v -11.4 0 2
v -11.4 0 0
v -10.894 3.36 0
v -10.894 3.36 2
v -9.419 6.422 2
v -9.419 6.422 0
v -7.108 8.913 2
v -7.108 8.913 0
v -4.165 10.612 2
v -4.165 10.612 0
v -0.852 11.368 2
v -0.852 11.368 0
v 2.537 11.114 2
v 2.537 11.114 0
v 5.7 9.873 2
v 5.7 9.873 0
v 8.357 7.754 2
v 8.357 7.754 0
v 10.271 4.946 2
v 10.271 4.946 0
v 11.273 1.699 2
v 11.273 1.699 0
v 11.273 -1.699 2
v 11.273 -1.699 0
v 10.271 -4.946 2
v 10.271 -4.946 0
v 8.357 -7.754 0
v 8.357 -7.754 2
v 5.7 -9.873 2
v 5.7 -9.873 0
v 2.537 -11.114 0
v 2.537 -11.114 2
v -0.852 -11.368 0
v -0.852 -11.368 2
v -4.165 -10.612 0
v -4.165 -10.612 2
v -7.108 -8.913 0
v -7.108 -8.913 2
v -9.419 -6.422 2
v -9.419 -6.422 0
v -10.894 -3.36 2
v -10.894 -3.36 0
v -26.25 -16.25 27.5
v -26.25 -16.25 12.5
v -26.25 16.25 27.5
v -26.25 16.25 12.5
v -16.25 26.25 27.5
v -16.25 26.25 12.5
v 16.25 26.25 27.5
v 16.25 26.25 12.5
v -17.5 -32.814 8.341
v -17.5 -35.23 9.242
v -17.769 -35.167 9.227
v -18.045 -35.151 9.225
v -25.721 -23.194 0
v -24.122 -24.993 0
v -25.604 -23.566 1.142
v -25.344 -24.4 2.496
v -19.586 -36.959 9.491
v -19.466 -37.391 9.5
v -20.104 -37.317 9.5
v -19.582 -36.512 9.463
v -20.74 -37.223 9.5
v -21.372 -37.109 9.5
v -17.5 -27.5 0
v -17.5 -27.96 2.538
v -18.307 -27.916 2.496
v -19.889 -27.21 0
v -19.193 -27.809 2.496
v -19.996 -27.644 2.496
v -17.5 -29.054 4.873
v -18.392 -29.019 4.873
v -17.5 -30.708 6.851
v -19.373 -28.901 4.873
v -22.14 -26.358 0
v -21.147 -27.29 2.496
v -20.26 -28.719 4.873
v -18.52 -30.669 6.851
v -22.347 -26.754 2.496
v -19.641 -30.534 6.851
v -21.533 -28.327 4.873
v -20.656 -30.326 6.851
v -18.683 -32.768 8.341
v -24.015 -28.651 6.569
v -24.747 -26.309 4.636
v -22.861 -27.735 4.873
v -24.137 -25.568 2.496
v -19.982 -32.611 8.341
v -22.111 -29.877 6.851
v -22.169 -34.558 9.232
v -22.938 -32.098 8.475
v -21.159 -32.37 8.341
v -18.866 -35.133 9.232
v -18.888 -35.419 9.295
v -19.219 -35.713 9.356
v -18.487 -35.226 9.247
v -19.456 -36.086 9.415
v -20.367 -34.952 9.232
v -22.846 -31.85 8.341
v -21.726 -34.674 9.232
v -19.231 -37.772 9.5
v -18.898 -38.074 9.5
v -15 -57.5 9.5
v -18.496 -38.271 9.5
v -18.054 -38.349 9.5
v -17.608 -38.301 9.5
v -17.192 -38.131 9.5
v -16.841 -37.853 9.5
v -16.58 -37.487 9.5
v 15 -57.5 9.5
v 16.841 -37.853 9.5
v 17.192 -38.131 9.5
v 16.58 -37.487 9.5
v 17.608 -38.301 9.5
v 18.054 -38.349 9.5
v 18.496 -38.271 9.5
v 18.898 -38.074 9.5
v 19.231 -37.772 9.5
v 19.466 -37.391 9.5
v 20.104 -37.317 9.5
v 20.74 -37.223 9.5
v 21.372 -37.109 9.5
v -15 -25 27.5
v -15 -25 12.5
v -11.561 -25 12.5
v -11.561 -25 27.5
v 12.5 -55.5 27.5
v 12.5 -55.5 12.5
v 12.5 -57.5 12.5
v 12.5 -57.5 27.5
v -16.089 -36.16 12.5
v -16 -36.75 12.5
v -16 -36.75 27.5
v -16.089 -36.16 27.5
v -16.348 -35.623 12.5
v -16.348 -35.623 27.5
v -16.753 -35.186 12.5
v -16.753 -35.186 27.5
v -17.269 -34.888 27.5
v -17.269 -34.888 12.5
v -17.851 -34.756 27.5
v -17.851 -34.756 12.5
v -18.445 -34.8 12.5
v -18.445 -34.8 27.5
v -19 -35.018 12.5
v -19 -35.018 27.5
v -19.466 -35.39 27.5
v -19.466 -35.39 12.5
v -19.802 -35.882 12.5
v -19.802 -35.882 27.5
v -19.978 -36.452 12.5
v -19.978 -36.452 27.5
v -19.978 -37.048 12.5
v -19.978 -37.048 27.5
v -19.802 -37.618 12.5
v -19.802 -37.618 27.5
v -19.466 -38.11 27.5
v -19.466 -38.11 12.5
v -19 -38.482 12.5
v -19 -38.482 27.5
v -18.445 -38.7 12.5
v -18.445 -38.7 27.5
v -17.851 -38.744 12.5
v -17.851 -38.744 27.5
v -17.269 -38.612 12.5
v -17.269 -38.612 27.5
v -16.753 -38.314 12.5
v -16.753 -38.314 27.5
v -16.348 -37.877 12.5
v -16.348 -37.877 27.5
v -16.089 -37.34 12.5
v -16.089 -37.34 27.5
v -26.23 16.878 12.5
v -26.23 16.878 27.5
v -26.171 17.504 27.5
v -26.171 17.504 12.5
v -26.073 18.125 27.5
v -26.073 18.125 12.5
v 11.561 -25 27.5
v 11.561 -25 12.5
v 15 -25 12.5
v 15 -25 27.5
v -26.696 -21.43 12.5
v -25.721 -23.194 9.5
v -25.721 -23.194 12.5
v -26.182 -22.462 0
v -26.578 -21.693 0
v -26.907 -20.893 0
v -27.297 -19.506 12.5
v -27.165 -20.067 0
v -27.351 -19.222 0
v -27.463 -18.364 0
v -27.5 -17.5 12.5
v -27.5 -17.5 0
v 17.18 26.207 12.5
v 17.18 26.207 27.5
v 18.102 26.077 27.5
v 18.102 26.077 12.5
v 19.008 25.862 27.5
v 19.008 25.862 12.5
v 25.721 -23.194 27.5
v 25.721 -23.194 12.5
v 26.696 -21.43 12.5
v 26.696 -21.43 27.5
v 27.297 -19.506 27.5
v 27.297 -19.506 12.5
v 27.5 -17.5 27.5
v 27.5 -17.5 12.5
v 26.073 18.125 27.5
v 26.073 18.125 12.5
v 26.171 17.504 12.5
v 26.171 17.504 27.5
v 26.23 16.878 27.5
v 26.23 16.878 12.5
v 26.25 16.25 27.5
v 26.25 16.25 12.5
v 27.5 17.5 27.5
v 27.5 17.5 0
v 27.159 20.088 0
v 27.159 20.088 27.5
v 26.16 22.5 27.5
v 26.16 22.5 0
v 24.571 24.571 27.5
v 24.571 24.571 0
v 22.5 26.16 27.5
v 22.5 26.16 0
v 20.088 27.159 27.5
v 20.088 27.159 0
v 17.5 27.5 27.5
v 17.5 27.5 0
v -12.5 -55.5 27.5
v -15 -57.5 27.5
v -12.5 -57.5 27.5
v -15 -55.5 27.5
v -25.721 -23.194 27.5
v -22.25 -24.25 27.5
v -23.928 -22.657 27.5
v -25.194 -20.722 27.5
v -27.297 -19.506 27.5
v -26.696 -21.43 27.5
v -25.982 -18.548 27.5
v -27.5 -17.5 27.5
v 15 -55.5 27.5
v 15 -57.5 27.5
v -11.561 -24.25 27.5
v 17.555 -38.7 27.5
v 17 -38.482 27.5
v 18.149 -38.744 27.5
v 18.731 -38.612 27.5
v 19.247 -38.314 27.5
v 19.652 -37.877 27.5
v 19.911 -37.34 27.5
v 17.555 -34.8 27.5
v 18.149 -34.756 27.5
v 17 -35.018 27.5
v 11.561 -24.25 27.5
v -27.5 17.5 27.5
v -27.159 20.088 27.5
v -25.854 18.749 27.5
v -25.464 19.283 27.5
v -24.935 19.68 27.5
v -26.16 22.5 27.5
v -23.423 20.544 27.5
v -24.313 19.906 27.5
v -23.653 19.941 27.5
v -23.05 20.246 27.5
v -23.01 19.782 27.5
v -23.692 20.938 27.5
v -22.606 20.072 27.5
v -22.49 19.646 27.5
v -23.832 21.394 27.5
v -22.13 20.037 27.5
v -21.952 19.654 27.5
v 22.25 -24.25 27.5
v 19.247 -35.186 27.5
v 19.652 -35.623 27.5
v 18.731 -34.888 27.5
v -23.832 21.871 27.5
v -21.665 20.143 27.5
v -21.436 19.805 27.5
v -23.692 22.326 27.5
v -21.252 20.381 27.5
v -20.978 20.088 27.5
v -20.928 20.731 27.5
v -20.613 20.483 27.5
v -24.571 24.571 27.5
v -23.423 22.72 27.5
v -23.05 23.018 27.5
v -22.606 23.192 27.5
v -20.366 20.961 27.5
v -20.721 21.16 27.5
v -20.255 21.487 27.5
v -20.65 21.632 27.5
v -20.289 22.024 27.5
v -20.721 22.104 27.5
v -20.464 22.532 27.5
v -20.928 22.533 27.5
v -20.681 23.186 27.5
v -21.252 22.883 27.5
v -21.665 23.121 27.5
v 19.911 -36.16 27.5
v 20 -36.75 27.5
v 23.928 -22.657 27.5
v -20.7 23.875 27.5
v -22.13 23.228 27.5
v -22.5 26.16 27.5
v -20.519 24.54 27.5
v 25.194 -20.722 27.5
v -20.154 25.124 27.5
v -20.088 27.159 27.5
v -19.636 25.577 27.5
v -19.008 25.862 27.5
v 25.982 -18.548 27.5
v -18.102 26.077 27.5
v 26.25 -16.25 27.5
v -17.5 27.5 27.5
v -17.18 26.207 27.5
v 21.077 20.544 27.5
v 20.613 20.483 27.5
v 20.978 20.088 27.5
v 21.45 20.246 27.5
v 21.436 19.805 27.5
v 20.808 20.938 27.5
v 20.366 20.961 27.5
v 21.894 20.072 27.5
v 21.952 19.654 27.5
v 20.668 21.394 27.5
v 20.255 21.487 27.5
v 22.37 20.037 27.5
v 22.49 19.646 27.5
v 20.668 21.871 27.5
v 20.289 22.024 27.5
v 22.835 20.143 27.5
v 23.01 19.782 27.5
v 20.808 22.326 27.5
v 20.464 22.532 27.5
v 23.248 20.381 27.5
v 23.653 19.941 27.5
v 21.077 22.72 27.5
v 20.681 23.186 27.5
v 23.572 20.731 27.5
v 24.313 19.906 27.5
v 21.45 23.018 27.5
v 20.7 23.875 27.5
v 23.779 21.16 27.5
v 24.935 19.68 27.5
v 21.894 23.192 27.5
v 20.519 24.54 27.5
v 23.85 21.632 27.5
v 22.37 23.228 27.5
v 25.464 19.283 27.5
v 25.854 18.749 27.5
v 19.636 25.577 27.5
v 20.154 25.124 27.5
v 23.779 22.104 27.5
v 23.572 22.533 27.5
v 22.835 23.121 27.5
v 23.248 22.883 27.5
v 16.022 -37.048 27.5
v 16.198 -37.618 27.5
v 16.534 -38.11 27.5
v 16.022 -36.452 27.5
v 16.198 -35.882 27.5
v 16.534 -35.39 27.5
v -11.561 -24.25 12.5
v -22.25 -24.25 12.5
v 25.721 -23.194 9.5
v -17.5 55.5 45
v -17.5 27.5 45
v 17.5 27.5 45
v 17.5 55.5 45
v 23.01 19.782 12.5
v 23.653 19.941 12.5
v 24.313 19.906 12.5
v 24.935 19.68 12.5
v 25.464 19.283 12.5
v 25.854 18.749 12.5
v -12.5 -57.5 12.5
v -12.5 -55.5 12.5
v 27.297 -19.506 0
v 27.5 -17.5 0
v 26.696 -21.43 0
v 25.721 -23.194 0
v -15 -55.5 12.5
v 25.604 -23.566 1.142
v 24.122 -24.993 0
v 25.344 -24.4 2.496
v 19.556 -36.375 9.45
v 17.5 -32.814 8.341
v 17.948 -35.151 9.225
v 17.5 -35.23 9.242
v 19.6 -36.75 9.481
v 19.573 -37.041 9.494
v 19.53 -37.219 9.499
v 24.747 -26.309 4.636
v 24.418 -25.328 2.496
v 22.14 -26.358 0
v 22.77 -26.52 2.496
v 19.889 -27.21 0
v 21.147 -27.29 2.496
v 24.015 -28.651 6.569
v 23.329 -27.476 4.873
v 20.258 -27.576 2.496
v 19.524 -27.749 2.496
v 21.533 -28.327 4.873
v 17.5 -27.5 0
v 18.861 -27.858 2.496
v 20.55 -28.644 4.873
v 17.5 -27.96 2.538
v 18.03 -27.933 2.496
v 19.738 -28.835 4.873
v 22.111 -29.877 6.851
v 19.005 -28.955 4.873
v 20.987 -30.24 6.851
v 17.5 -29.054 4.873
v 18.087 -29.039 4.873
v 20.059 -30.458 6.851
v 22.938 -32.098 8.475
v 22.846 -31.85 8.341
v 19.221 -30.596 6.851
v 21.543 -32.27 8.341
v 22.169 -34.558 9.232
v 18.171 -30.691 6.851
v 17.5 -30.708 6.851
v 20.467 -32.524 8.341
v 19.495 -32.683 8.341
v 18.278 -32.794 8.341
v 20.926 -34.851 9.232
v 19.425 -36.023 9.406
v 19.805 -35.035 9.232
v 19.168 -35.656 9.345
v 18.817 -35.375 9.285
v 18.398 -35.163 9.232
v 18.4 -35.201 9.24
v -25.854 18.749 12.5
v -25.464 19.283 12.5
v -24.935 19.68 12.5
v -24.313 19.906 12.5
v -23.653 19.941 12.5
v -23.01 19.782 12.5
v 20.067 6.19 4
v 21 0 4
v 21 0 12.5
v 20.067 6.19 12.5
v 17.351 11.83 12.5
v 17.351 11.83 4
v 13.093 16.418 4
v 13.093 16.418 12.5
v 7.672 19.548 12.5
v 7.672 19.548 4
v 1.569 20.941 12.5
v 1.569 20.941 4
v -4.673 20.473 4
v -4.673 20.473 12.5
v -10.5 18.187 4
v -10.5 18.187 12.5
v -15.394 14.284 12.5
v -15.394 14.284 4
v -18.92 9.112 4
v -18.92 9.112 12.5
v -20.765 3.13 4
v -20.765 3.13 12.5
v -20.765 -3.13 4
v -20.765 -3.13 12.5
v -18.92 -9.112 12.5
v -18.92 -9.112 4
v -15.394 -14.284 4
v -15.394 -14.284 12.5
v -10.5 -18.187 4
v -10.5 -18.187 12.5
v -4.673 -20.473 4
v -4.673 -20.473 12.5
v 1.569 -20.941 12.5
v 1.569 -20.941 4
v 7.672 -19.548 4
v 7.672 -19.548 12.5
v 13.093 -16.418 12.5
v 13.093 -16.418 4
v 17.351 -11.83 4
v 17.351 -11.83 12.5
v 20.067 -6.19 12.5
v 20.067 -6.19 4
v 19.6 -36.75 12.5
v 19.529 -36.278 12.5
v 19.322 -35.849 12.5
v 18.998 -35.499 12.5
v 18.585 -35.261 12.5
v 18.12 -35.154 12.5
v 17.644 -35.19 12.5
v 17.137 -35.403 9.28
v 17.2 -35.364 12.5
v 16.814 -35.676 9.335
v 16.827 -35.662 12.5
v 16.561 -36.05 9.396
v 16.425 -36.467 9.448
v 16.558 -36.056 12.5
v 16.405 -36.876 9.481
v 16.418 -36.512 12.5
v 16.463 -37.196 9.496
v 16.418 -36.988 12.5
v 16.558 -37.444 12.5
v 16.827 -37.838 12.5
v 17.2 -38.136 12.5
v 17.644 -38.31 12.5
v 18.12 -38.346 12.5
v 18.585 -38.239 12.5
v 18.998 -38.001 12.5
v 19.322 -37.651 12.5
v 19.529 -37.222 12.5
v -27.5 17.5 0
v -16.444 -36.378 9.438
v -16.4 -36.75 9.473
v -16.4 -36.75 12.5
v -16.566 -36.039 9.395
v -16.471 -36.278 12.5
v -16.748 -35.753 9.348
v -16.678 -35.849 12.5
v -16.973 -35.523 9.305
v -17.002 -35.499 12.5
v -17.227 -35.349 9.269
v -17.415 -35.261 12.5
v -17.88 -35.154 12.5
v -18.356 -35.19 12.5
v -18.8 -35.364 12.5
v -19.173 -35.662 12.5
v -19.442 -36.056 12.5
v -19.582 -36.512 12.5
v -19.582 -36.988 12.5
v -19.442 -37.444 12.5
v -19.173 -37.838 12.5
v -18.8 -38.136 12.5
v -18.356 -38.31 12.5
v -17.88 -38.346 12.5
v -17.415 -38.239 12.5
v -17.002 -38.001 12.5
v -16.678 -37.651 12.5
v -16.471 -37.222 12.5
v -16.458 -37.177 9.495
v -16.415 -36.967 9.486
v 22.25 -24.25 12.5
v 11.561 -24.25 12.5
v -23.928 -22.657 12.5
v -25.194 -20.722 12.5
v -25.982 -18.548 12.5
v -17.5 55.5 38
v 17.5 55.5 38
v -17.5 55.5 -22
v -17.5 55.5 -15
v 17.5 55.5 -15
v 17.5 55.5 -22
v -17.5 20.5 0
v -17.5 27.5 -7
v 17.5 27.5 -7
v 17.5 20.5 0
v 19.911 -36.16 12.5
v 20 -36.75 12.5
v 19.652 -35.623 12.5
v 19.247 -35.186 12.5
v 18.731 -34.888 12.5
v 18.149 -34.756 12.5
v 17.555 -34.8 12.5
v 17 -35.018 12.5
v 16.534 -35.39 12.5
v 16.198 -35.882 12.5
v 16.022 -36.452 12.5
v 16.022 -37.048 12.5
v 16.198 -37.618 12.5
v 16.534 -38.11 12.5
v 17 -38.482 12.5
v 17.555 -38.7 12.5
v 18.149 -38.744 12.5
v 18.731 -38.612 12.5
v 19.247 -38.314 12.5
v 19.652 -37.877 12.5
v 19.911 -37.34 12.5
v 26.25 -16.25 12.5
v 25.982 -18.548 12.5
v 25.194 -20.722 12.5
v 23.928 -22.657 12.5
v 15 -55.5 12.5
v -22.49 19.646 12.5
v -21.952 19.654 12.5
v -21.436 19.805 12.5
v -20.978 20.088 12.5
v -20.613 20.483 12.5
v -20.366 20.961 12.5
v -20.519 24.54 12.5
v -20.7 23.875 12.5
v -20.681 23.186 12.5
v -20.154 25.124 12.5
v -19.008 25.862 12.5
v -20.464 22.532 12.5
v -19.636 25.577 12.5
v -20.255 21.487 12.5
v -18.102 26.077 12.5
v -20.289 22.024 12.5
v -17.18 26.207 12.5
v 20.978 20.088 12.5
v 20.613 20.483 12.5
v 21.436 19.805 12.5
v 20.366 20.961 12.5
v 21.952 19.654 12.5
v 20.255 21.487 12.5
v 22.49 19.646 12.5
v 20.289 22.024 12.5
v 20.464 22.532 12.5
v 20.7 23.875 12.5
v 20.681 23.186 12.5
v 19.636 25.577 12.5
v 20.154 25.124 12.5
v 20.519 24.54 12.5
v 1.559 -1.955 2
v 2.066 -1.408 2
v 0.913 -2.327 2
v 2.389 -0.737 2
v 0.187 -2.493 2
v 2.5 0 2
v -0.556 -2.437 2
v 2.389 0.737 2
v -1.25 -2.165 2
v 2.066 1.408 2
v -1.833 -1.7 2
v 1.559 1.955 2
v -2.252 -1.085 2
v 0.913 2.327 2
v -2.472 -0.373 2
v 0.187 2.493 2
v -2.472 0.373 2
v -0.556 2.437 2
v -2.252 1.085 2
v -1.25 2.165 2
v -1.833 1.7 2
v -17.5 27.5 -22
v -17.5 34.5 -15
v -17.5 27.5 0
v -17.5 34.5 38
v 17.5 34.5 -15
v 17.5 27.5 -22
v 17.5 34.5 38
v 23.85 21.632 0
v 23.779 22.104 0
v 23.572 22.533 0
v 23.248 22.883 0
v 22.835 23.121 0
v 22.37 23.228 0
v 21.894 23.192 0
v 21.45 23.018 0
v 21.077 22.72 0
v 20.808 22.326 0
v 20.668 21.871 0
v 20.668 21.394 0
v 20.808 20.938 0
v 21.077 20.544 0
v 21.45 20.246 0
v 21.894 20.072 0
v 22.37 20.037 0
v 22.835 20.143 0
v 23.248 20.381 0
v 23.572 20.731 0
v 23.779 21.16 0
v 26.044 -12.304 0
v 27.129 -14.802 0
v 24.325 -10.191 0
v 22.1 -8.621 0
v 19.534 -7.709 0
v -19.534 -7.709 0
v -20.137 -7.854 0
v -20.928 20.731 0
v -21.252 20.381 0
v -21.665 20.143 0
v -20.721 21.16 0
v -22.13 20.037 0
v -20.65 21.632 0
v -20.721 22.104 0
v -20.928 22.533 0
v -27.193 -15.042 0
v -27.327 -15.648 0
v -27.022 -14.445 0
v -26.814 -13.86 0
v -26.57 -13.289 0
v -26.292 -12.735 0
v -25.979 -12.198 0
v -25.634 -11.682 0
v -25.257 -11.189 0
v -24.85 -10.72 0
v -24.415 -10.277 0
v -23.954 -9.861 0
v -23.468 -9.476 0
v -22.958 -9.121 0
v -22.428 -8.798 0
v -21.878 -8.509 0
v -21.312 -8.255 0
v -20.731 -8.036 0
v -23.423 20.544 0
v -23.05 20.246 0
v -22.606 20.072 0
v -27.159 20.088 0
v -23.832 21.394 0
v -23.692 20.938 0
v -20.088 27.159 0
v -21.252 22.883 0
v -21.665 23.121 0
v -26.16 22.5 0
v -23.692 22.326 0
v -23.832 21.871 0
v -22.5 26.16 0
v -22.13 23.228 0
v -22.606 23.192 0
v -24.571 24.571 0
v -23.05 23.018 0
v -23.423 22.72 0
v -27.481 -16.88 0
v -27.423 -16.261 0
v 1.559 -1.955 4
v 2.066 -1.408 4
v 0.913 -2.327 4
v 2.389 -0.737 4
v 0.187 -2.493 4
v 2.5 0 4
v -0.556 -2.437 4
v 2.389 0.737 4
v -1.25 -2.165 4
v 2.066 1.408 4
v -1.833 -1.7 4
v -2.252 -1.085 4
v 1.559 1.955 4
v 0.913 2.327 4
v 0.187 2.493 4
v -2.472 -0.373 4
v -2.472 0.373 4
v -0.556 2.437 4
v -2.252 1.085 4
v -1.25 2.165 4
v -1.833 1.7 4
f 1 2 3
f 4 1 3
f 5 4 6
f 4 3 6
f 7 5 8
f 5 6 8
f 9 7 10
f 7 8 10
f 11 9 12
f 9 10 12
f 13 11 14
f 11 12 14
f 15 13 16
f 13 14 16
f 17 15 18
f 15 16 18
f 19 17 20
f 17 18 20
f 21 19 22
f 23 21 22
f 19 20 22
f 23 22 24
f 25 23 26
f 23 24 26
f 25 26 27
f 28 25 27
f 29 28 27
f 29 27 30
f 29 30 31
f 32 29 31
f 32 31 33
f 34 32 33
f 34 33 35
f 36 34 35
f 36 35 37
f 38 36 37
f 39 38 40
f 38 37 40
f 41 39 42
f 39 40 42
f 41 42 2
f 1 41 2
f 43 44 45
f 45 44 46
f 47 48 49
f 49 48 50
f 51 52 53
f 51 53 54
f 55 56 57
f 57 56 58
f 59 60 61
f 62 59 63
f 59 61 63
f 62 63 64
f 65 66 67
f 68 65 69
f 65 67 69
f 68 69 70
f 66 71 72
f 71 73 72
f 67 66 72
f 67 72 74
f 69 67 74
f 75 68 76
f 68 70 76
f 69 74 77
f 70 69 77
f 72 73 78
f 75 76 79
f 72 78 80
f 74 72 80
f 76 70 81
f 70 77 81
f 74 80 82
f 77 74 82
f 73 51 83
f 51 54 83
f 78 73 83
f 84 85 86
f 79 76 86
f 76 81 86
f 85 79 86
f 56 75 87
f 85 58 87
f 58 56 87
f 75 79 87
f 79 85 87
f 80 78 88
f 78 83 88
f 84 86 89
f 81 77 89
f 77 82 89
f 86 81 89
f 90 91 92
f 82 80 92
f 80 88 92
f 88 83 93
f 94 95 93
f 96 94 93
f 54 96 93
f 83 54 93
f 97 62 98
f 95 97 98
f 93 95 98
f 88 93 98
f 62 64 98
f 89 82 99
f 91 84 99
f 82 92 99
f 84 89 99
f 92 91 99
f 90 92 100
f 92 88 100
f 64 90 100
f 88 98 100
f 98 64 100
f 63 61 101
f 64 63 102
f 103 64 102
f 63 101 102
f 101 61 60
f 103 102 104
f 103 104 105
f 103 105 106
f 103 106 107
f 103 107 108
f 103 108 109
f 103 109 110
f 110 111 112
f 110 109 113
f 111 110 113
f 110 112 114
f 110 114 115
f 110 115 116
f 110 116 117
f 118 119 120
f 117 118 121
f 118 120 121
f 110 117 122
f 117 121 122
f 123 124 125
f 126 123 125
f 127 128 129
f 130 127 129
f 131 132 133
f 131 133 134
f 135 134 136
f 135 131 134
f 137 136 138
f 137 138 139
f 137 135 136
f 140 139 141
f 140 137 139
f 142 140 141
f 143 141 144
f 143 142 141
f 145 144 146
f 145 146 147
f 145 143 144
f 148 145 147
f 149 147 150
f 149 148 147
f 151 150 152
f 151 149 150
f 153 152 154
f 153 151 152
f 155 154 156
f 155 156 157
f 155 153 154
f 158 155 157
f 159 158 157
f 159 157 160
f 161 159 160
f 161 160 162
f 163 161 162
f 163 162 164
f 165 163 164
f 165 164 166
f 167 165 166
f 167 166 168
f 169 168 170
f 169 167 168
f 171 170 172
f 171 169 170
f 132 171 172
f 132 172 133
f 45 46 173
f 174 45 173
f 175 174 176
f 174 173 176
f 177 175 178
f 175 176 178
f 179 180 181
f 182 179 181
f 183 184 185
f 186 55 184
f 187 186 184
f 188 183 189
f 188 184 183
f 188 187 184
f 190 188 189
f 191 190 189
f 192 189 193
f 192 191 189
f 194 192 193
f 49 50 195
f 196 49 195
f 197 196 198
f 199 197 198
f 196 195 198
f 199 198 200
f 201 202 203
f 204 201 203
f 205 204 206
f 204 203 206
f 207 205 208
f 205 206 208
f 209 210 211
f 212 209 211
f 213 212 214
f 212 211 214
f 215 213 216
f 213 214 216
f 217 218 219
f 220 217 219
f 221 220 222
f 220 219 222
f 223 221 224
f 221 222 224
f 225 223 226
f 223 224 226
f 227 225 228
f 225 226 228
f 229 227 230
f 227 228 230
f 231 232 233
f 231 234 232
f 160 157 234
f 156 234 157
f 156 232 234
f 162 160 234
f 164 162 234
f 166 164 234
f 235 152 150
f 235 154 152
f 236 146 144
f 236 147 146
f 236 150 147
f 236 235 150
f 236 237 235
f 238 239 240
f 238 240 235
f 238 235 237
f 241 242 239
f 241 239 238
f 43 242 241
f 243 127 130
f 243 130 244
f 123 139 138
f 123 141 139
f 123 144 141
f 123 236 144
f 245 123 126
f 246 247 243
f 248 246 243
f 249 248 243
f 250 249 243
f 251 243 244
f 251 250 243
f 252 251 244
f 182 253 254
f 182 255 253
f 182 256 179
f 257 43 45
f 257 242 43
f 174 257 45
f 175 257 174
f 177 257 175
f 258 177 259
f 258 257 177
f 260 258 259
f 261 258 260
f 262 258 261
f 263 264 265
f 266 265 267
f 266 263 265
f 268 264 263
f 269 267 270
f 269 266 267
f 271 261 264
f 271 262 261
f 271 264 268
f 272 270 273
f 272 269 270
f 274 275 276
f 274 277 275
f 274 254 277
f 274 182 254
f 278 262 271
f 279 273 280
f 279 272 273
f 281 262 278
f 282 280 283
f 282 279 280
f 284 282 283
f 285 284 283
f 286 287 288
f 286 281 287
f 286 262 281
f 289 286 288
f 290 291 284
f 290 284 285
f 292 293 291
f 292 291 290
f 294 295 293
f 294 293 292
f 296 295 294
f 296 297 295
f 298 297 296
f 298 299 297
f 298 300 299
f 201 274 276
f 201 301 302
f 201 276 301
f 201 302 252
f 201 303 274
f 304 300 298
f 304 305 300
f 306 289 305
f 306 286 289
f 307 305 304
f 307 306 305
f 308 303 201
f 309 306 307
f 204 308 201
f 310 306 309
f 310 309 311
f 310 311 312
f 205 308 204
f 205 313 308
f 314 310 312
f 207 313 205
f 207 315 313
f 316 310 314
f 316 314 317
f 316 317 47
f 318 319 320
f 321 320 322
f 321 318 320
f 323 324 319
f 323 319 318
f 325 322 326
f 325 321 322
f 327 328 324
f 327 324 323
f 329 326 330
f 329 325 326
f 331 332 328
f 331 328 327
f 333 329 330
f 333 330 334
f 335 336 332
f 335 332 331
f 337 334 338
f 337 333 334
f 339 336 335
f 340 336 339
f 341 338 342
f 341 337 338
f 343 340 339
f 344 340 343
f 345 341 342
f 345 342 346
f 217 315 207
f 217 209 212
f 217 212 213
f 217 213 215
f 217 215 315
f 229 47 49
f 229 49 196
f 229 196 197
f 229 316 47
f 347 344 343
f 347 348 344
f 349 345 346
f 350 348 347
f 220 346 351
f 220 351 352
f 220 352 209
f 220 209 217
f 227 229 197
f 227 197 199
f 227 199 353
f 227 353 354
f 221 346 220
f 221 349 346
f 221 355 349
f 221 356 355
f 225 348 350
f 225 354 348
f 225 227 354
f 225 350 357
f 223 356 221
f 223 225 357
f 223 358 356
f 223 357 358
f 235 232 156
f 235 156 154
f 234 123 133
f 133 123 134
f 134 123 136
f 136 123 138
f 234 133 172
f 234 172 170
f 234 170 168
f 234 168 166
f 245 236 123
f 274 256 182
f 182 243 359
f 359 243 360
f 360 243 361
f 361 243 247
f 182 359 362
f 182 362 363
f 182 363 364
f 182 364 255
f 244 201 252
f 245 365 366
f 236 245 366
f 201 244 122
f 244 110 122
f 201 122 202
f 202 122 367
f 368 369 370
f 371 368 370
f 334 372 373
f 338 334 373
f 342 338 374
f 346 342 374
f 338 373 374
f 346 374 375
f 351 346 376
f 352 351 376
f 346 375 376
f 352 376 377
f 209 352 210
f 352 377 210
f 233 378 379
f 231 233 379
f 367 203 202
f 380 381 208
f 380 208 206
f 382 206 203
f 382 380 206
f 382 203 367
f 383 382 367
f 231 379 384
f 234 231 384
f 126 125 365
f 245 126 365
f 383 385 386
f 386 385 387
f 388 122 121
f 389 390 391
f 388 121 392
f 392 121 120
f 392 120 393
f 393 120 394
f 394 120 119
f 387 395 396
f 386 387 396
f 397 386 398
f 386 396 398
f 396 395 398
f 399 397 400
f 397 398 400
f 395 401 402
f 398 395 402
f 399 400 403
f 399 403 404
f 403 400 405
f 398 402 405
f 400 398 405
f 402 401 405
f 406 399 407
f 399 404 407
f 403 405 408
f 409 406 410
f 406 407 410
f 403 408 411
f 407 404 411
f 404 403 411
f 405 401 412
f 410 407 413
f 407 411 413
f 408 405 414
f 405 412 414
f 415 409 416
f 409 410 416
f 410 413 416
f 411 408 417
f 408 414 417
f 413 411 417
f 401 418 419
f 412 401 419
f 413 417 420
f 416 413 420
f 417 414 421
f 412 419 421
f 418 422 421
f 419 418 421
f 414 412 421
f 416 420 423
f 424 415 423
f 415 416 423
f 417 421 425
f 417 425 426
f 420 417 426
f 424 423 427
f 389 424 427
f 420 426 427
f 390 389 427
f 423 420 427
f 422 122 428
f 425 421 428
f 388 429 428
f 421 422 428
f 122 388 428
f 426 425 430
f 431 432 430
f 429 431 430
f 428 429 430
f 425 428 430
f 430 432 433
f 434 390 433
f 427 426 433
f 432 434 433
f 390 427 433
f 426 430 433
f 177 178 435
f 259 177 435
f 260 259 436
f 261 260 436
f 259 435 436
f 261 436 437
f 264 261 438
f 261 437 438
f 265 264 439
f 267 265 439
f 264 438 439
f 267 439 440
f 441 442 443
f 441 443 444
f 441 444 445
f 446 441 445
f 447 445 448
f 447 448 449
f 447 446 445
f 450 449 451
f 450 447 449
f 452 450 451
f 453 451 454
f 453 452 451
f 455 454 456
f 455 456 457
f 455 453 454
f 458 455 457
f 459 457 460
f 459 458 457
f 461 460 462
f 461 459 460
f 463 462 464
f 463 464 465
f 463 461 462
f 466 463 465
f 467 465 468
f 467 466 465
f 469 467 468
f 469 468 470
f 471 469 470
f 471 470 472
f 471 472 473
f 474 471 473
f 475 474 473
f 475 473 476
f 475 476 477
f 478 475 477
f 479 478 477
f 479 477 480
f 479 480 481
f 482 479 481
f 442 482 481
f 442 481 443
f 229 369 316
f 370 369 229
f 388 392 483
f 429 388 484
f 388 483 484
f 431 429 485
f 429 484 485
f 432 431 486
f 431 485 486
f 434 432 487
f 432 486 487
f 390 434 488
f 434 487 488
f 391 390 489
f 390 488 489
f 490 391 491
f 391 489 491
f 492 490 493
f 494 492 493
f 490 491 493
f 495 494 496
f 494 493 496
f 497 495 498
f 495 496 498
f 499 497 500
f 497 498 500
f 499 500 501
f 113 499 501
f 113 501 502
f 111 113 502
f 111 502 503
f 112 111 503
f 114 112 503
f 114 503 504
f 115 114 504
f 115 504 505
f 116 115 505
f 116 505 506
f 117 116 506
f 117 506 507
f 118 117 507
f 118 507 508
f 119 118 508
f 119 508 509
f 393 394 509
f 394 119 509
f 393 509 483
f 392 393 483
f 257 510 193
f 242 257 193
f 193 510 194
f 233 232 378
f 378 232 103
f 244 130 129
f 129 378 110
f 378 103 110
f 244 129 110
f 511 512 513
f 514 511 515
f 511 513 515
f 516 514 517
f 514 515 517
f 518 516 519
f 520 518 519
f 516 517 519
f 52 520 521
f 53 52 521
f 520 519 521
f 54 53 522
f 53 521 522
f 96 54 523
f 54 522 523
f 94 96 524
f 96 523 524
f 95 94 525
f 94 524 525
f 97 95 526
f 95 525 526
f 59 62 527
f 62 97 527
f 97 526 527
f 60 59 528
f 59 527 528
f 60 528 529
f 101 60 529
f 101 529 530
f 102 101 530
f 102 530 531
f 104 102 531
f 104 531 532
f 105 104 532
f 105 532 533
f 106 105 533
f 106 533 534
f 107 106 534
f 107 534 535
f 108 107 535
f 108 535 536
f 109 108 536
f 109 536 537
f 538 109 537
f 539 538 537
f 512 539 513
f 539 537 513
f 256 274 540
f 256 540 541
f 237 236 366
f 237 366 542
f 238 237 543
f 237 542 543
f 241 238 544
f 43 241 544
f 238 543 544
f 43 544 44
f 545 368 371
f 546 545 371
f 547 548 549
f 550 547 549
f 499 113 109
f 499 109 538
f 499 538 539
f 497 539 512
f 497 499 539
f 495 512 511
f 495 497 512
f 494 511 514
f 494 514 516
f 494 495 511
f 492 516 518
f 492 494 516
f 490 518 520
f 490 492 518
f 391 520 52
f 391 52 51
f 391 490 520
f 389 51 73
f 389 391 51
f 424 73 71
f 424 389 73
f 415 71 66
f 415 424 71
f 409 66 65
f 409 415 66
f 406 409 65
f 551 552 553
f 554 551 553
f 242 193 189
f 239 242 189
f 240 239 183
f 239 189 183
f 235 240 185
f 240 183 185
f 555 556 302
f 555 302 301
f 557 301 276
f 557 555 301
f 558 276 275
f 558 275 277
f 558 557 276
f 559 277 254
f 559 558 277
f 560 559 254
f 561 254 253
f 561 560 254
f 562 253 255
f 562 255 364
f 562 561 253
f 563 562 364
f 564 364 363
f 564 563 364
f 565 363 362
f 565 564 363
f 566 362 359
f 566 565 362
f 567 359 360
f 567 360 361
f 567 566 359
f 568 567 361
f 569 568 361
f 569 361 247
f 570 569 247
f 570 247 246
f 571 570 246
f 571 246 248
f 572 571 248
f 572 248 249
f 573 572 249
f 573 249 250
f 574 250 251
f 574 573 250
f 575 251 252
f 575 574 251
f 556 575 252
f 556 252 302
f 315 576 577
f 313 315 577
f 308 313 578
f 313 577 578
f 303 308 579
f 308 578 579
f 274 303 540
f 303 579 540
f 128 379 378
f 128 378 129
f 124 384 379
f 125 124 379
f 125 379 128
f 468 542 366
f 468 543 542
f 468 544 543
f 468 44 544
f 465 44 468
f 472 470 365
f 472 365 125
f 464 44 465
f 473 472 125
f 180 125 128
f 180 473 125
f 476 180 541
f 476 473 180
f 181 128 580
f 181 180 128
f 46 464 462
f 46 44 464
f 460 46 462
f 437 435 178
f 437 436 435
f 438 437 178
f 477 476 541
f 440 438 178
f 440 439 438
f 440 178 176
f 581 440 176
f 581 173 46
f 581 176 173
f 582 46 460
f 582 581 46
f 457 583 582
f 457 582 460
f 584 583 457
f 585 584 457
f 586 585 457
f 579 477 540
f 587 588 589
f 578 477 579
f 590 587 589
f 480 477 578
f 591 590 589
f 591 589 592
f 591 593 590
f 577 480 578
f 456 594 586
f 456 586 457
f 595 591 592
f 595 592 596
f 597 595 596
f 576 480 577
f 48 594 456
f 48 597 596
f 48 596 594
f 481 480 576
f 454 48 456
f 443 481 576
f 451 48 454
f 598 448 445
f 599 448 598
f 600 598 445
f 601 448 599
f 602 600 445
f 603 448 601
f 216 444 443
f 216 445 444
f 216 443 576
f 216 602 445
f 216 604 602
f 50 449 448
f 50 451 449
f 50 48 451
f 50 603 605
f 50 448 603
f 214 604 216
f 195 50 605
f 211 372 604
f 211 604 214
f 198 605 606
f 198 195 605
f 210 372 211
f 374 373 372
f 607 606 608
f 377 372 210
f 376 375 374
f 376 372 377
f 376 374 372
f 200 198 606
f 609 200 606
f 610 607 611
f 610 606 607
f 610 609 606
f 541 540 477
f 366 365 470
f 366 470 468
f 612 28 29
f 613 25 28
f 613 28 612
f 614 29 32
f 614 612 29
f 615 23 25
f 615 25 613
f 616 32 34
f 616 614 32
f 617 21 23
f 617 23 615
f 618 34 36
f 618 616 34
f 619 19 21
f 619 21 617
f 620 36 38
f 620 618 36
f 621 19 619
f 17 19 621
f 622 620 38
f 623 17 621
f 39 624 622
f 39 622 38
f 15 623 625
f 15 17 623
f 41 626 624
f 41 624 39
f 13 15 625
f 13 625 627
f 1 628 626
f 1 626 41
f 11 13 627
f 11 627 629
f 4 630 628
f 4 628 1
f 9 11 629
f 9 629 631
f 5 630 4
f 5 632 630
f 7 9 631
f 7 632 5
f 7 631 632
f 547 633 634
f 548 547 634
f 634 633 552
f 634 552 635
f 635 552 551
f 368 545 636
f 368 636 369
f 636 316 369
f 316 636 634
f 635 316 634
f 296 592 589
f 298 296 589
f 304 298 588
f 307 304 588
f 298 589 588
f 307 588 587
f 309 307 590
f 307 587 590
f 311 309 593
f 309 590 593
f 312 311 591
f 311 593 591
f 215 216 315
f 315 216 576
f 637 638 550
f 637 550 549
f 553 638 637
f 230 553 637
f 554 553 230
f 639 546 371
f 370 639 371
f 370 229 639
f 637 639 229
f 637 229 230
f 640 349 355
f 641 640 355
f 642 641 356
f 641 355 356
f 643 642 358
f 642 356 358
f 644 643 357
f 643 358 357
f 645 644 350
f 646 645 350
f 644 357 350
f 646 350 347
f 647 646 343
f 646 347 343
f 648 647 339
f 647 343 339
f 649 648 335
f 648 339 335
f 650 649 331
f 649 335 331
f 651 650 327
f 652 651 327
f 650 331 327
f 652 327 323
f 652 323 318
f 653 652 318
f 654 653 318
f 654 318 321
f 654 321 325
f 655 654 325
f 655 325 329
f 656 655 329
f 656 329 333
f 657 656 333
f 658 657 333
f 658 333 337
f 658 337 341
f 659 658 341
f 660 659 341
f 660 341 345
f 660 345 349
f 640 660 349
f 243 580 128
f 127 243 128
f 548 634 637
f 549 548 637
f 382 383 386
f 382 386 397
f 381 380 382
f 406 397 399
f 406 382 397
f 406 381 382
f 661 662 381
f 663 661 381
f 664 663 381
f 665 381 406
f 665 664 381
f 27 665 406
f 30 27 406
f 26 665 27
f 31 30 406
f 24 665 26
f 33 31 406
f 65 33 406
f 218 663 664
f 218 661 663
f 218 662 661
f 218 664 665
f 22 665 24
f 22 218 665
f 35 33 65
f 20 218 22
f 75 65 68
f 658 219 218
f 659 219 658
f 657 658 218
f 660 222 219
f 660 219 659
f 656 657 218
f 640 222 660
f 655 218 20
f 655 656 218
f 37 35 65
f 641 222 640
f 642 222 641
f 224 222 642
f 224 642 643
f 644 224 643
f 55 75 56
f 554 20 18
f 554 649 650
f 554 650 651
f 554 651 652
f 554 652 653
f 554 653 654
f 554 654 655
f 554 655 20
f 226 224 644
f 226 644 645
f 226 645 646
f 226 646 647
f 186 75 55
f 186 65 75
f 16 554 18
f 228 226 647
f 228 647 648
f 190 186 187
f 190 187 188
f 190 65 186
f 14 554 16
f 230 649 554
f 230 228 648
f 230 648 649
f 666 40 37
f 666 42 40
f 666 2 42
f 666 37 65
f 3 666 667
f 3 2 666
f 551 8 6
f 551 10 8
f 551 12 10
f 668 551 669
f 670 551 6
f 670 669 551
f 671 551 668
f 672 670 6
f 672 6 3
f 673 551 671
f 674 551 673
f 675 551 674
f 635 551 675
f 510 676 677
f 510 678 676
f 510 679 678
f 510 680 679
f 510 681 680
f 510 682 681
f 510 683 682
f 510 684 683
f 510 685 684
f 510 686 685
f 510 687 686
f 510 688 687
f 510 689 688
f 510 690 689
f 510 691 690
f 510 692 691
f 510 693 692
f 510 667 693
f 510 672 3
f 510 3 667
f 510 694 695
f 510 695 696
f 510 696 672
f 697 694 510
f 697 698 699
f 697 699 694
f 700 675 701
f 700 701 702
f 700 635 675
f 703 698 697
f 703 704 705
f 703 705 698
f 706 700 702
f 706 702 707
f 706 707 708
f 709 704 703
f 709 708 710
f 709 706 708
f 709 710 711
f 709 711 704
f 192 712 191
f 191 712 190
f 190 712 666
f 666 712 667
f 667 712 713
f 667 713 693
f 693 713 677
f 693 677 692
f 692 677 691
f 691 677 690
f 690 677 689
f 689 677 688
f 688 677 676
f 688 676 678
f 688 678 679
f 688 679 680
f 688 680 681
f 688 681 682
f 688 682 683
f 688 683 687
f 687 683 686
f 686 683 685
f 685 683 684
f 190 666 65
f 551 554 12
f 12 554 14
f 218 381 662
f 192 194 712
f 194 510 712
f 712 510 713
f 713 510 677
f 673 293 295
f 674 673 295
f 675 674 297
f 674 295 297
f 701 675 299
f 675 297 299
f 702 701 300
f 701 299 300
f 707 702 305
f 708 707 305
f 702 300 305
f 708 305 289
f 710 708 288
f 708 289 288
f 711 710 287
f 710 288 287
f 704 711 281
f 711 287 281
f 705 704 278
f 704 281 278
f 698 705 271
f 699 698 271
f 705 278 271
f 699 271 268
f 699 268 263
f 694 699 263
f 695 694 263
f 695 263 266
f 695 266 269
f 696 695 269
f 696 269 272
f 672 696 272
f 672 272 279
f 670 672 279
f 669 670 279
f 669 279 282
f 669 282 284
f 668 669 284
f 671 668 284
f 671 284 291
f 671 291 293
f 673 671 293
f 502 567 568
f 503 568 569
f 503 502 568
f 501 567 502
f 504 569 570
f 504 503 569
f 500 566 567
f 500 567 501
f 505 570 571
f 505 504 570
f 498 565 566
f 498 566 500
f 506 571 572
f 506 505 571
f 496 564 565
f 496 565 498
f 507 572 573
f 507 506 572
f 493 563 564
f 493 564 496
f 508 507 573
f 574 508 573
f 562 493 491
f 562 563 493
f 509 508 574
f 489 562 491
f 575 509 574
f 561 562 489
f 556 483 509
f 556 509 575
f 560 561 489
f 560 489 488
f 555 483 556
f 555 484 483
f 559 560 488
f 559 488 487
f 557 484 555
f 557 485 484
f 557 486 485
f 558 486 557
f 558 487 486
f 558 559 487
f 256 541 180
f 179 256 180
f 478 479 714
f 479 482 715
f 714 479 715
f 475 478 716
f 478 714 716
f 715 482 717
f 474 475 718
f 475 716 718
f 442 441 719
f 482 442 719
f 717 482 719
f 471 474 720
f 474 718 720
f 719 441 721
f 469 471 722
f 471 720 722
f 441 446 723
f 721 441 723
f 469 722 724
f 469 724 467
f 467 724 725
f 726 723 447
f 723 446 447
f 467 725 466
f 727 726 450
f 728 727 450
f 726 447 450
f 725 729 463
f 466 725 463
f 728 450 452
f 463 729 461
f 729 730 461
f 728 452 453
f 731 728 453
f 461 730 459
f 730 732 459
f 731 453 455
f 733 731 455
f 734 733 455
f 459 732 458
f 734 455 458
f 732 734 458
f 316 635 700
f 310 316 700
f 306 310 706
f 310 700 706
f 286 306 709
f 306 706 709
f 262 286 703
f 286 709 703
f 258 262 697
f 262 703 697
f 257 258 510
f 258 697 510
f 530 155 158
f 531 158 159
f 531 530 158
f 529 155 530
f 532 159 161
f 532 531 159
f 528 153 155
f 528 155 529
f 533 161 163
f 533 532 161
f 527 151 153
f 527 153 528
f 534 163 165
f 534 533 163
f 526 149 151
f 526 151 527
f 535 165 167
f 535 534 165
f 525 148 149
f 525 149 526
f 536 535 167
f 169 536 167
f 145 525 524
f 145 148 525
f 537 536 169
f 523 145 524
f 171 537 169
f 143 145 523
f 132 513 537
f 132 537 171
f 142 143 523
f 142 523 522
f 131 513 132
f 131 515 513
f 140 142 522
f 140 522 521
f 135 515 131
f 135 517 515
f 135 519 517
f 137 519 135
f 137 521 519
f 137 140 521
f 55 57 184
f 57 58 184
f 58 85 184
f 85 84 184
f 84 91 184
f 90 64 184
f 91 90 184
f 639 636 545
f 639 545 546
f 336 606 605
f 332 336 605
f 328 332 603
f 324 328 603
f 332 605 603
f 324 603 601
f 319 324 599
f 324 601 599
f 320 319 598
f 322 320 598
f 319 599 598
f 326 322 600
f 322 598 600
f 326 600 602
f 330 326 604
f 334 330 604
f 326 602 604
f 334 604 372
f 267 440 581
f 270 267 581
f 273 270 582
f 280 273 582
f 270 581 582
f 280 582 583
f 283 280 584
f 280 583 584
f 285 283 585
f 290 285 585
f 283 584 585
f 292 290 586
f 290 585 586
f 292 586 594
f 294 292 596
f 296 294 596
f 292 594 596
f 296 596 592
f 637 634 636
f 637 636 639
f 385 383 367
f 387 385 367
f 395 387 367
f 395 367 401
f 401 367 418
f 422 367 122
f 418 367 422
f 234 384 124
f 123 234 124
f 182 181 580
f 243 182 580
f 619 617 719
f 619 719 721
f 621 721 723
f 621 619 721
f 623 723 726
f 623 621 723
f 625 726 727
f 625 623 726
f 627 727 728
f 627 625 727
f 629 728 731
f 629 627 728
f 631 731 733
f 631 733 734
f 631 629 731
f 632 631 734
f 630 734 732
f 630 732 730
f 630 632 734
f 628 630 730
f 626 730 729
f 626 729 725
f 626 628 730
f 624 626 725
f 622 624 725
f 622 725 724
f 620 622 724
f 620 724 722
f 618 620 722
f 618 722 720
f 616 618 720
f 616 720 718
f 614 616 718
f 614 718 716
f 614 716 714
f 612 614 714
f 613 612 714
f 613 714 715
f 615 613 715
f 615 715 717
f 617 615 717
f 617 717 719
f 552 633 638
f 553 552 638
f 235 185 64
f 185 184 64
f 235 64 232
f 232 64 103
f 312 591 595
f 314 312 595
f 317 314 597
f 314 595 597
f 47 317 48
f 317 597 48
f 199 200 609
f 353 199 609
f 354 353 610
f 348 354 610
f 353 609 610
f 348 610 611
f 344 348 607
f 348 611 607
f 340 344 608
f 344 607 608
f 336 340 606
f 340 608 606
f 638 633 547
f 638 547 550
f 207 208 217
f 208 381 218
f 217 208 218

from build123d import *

# Parameters (mm, degrees)
CROQUIS4_R                  = 2.5
SALIENTE_EXTRUIR1_DEPTH     = 4
CROQUIS5_R                  = 21
SALIENTE_EXTRUIR2_DEPTH     = 8.5
SALIENTE_EXTRUIR4_START     = -3
SALIENTE_EXTRUIR4_DEPTH     = 3
REDONDEO1_R                 = 10
SALIENTE_EXTRUIR5_OUTLINE_R = 2
SALIENTE_EXTRUIR5_DEPTH     = 15
CROQUIS9_R                  = 1.6
CORTAR_EXTRUIR1_DEPTH       = 70.417217007
CROQUIS11_W                 = 35
CROQUIS11_H                 = 53
SALIENTE_EXTRUIR7_DEPTH     = 7
CROQUIS12_W                 = 35
CROQUIS12_H                 = 7
SALIENTE_EXTRUIR8_DEPTH     = 28
CHAFL_N2_SIZE               = 7
CROQUIS13_R                 = 11.4
CORTAR_EXTRUIR2_DEPTH       = 2


# Read off the part's stored shape, not the designer's step: Saliente-Extruir5
with BuildPart() as part:
    # Croquis4 → Saliente-Extruir1 (new body)
    with BuildSketch(Plane.XY):
        with BuildLine():
            Line((-17.5, 27.5), (17.5, 27.5))
            ThreePointArc((17.5, 27.5), (24.571067812, 24.571067812), (27.5, 17.5))
            Line((27.5, 17.5), (27.5, -17.5))
            ThreePointArc((27.5, -17.5), (24.571067812, -24.571067812), (17.5, -27.5))
            Line((17.5, -27.5), (-17.5, -27.5))
            ThreePointArc((-17.5, -27.5), (-24.571067812, -24.571067812), (-27.5, -17.5))
            Line((-27.5, -17.5), (-27.5, 17.5))
            ThreePointArc((-27.5, 17.5), (-24.571067812, 24.571067812), (-17.5, 27.5))
        make_face()
        Circle(CROQUIS4_R, mode=Mode.SUBTRACT)
    extrude(amount=SALIENTE_EXTRUIR1_DEPTH)

    # Croquis5 → Saliente-Extruir2 (add)
    with BuildSketch(Plane.XY.offset(4)):
        with BuildLine():
            Line((-17.5, 27.5), (17.5, 27.5))
            ThreePointArc((17.5, 27.5), (24.571067812, 24.571067812), (27.5, 17.5))
            Line((27.5, 17.5), (27.5, -17.5))
            ThreePointArc((27.5, -17.5), (24.571067812, -24.571067812), (17.5, -27.5))
            Line((17.5, -27.5), (-17.5, -27.5))
            ThreePointArc((-17.5, -27.5), (-24.571067812, -24.571067812), (-27.5, -17.5))
            Line((-27.5, -17.5), (-27.5, 17.5))
            ThreePointArc((-27.5, 17.5), (-24.571067812, 24.571067812), (-17.5, 27.5))
        make_face()
        Circle(CROQUIS5_R, mode=Mode.SUBTRACT)
    extrude(amount=SALIENTE_EXTRUIR2_DEPTH)

    # Croquis6 → Saliente-Extruir4 (add)
    with BuildSketch(Plane.XY.offset(12.5).offset(SALIENTE_EXTRUIR4_START)):
        with BuildLine():
            Line((-25.720640569, -23.193950178), (-15, -57.5))
            Line((-15, -57.5), (15, -57.5))
            Line((15, -57.5), (25.720640569, -23.193950178))
            ThreePointArc((25.720640569, -23.193950178), (22.140069947, -26.358315353), (17.5, -27.5))
            Line((17.5, -27.5), (-17.5, -27.5))
            ThreePointArc((-17.5, -27.5), (-22.140069947, -26.358315353), (-25.720640569, -23.193950178))
        make_face()
    extrude(amount=SALIENTE_EXTRUIR4_DEPTH)

    # Redondeo1
    # the kernel refuses this fillet: 10 mm, written as the material it adds along each edge
    with BuildSketch(Plane(origin=(17.5, -17.5, 9.5), x_dir=(-0.31521717271258337, 0.949019564617656, 0), z_dir=(-0.949019564617656, -0.31521717271258337, 0))) as redondeo1_piece_1_section:
        with BuildLine():
            CenterArc((19.987492178, 10), REDONDEO1_R, 182.865983983, 87.134016017)
            Line((19.987492178, 0), (10, 0))
            Line((10, 0), (10, 9.5))
        make_face()
    redondeo1_piece_1 = revolve(axis=Axis((17.5, -17.5, 9.5), (0, 0, -1)), revolution_arc=198.373924806, mode=Mode.PRIVATE)
    redondeo1_piece_1 = split(redondeo1_piece_1, bisect_by=Plane(origin=(27.5, -26.624186886, 2.060383814), z_dir=(-1, 0, 0)), keep=Keep.TOP, mode=Mode.PRIVATE)
    redondeo1_piece_1 = redondeo1_piece_1 - Plane(origin=(0, 0, 2.060383814), x_dir=(1, 0, 0), z_dir=(0, 0, -1)) * Cylinder(21, 80, mode=Mode.PRIVATE)
    redondeo1_piece_1 = split(redondeo1_piece_1, bisect_by=Plane(origin=(24.437894836, -27.298736526, 2.060383814), z_dir=(-0.9544799780350299, 0.2982749931359464, 0)), keep=Keep.TOP, mode=Mode.PRIVATE)
    add(redondeo1_piece_1)
    with BuildSketch(Plane(origin=(-17.5, -17.5, 9.5), x_dir=(0, -1, 0), z_dir=(1, 0, 0))) as redondeo1_piece_2_section:
        with BuildLine():
            CenterArc((19.987492178, 10), REDONDEO1_R, 182.865983983, 87.134016017)
            Line((19.987492178, 0), (10, 0))
            Line((10, 0), (10, 9.5))
        make_face()
    redondeo1_piece_2 = revolve(axis=Axis((-17.5, -17.5, 9.5), (0, 0, -1)), revolution_arc=198.373924806, mode=Mode.PRIVATE)
    redondeo1_piece_2 = split(redondeo1_piece_2, bisect_by=Plane(origin=(-27.5, -26.624186886, 2.060383814), z_dir=(1, 0, 0)), keep=Keep.TOP, mode=Mode.PRIVATE)
    redondeo1_piece_2 = redondeo1_piece_2 - Plane(origin=(0, 0, 2.060383814), x_dir=(1, 0, 0), z_dir=(0, 0, -1)) * Cylinder(21, 80, mode=Mode.PRIVATE)
    redondeo1_piece_2 = split(redondeo1_piece_2, bisect_by=Plane(origin=(-24.437894836, -27.298736526, 2.060383814), z_dir=(0.9544799780350299, 0.29827499313594635, 0)), keep=Keep.TOP, mode=Mode.PRIVATE)
    add(redondeo1_piece_2)
    with BuildSketch(Plane(origin=(17.5, -27.5, 9.5), x_dir=(0, 0, -1), z_dir=(-1, 0, 0))) as redondeo1_piece_3:
        with BuildLine():
            CenterArc((10, 9.987492178), REDONDEO1_R, 180, 87.134016017)
            Line((0, 9.987492178), (0, 0))
            Line((0, 0), (9.5, 0))
        make_face()
    extrude(amount=35)

    # Saliente-Extruir5 outline → Saliente-Extruir5 (add)
    with BuildSketch(Plane.XY.offset(12.5)):
        with BuildLine():
            ThreePointArc((-27.5, -17.5), (-27.04479978, -20.482749931), (-25.720640569, -23.193950178))
            Line((-25.720640569, -23.193950178), (-15, -57.5))
            Line((-15, -57.5), (-12.5, -57.5))
            Line((-12.5, -57.5), (-12.5, -55.5))
            Line((-12.5, -55.5), (-15, -55.5))
            Line((-15, -55.5), (-15, -25))
            Line((-15, -25), (-11.560632513, -25))
            Line((-11.560632513, -25), (-11.560632513, -24.25))
            Line((-11.560632513, -24.25), (-22.25, -24.25))
            ThreePointArc((-22.25, -24.25), (-25.19427191, -20.722135955), (-26.25, -16.25))
            Line((-26.25, -16.25), (-26.25, 16.25))
            ThreePointArc((-26.25, 16.25), (-26.205571214, 17.191595354), (-26.072679638, 18.12482392))
            ThreePointArc((-26.072679638, 18.12482392), (-24.934779512, 19.680078923), (-23.010409798, 19.782235789))
            ThreePointArc((-23.010409798, 19.782235789), (-20.782444846, 20.273260806), (-20.464111601, 22.532375088))
            ThreePointArc((-20.464111601, 22.532375088), (-20.519074057, 24.539569231), (-19.008189542, 25.862096049))
            ThreePointArc((-19.008189542, 25.862096049), (-17.64266642, 26.152549179), (-16.25, 26.25))
            Line((-16.25, 26.25), (16.25, 26.25))
            ThreePointArc((16.25, 26.25), (17.64266642, 26.152549179), (19.008189542, 25.862096049))
            ThreePointArc((19.008189542, 25.862096049), (20.519074057, 24.539569231), (20.464111601, 22.532375088))
            ThreePointArc((20.464111601, 22.532375088), (20.782444846, 20.273260806), (23.010409798, 19.782235789))
            ThreePointArc((23.010409798, 19.782235789), (24.934779512, 19.680078923), (26.072679638, 18.12482392))
            ThreePointArc((26.072679638, 18.12482392), (26.205571214, 17.191595354), (26.25, 16.25))
            Line((26.25, 16.25), (26.25, -16.25))
            ThreePointArc((26.25, -16.25), (25.19427191, -20.722135955), (22.25, -24.25))
            Line((22.25, -24.25), (11.560632513, -24.25))
            Line((11.560632513, -24.25), (11.560632513, -25))
            Line((11.560632513, -25), (15, -25))
            Line((15, -25), (15, -55.5))
            Line((15, -55.5), (12.5, -55.5))
            Line((12.5, -55.5), (12.5, -57.5))
            Line((12.5, -57.5), (15, -57.5))
            Line((15, -57.5), (25.720640569, -23.193950178))
            ThreePointArc((25.720640569, -23.193950178), (27.04479978, -20.482749931), (27.5, -17.5))
            Line((27.5, -17.5), (27.5, 17.5))
            ThreePointArc((27.5, 17.5), (24.571067812, 24.571067812), (17.5, 27.5))
            Line((17.5, 27.5), (-17.5, 27.5))
            ThreePointArc((-17.5, 27.5), (-24.571067812, 24.571067812), (-27.5, 17.5))
            Line((-27.5, 17.5), (-27.5, -17.5))
        make_face()
        with Locations((-18, -36.75)):
            Circle(SALIENTE_EXTRUIR5_OUTLINE_R, mode=Mode.SUBTRACT)
        with Locations((18, -36.75)):
            Circle(SALIENTE_EXTRUIR5_OUTLINE_R, mode=Mode.SUBTRACT)
    extrude(amount=SALIENTE_EXTRUIR5_DEPTH)

    # Croquis9 → Cortar-Extruir1 (cut, through all)
    with BuildSketch(Plane.XY.offset(27.5)):
        with Locations((-22.25, 21.632040357)):
            Circle(CROQUIS9_R)
        with Locations((-18, -36.75)):
            Circle(CROQUIS9_R)
        with Locations((18, -36.75)):
            Circle(CROQUIS9_R)
        with Locations((22.25, 21.632040357)):
            Circle(CROQUIS9_R)
    extrude(amount=-CORTAR_EXTRUIR1_DEPTH, mode=Mode.SUBTRACT)

    # Croquis11 → Saliente-Extruir7 (add)
    with BuildSketch(Plane(origin=(0, 27.5, 0), x_dir=(1, 0, 0), z_dir=(0, 1, 0))):
        with Locations((0, -11.5)):
            Rectangle(CROQUIS11_W, CROQUIS11_H)
    extrude(amount=SALIENTE_EXTRUIR7_DEPTH)

    # Croquis12 → Saliente-Extruir8 (add)
    with BuildSketch(Plane.XZ.offset(-27.5)):
        with Locations((0, 41.5)):
            Rectangle(CROQUIS12_W, CROQUIS12_H)
        with Locations((0, -18.5)):
            Rectangle(CROQUIS12_W, CROQUIS12_H)
    extrude(amount=-SALIENTE_EXTRUIR8_DEPTH)

    # Chaflán2
    chafl_n2_edges = [part.edges().sort_by_distance(p)[0] for p in [
        (0, 27.5, 0),
    ]]
    chamfer(chafl_n2_edges, length=CHAFL_N2_SIZE)

    # Croquis13 → Cortar-Extruir2 (cut)
    with BuildSketch(Plane(origin=(0, 0, 0), x_dir=(-1, 0, 0), z_dir=(0, 0, -1))):
        Circle(CROQUIS13_R)
    extrude(amount=-CORTAR_EXTRUIR2_DEPTH, mode=Mode.SUBTRACT)


solid = part.part
